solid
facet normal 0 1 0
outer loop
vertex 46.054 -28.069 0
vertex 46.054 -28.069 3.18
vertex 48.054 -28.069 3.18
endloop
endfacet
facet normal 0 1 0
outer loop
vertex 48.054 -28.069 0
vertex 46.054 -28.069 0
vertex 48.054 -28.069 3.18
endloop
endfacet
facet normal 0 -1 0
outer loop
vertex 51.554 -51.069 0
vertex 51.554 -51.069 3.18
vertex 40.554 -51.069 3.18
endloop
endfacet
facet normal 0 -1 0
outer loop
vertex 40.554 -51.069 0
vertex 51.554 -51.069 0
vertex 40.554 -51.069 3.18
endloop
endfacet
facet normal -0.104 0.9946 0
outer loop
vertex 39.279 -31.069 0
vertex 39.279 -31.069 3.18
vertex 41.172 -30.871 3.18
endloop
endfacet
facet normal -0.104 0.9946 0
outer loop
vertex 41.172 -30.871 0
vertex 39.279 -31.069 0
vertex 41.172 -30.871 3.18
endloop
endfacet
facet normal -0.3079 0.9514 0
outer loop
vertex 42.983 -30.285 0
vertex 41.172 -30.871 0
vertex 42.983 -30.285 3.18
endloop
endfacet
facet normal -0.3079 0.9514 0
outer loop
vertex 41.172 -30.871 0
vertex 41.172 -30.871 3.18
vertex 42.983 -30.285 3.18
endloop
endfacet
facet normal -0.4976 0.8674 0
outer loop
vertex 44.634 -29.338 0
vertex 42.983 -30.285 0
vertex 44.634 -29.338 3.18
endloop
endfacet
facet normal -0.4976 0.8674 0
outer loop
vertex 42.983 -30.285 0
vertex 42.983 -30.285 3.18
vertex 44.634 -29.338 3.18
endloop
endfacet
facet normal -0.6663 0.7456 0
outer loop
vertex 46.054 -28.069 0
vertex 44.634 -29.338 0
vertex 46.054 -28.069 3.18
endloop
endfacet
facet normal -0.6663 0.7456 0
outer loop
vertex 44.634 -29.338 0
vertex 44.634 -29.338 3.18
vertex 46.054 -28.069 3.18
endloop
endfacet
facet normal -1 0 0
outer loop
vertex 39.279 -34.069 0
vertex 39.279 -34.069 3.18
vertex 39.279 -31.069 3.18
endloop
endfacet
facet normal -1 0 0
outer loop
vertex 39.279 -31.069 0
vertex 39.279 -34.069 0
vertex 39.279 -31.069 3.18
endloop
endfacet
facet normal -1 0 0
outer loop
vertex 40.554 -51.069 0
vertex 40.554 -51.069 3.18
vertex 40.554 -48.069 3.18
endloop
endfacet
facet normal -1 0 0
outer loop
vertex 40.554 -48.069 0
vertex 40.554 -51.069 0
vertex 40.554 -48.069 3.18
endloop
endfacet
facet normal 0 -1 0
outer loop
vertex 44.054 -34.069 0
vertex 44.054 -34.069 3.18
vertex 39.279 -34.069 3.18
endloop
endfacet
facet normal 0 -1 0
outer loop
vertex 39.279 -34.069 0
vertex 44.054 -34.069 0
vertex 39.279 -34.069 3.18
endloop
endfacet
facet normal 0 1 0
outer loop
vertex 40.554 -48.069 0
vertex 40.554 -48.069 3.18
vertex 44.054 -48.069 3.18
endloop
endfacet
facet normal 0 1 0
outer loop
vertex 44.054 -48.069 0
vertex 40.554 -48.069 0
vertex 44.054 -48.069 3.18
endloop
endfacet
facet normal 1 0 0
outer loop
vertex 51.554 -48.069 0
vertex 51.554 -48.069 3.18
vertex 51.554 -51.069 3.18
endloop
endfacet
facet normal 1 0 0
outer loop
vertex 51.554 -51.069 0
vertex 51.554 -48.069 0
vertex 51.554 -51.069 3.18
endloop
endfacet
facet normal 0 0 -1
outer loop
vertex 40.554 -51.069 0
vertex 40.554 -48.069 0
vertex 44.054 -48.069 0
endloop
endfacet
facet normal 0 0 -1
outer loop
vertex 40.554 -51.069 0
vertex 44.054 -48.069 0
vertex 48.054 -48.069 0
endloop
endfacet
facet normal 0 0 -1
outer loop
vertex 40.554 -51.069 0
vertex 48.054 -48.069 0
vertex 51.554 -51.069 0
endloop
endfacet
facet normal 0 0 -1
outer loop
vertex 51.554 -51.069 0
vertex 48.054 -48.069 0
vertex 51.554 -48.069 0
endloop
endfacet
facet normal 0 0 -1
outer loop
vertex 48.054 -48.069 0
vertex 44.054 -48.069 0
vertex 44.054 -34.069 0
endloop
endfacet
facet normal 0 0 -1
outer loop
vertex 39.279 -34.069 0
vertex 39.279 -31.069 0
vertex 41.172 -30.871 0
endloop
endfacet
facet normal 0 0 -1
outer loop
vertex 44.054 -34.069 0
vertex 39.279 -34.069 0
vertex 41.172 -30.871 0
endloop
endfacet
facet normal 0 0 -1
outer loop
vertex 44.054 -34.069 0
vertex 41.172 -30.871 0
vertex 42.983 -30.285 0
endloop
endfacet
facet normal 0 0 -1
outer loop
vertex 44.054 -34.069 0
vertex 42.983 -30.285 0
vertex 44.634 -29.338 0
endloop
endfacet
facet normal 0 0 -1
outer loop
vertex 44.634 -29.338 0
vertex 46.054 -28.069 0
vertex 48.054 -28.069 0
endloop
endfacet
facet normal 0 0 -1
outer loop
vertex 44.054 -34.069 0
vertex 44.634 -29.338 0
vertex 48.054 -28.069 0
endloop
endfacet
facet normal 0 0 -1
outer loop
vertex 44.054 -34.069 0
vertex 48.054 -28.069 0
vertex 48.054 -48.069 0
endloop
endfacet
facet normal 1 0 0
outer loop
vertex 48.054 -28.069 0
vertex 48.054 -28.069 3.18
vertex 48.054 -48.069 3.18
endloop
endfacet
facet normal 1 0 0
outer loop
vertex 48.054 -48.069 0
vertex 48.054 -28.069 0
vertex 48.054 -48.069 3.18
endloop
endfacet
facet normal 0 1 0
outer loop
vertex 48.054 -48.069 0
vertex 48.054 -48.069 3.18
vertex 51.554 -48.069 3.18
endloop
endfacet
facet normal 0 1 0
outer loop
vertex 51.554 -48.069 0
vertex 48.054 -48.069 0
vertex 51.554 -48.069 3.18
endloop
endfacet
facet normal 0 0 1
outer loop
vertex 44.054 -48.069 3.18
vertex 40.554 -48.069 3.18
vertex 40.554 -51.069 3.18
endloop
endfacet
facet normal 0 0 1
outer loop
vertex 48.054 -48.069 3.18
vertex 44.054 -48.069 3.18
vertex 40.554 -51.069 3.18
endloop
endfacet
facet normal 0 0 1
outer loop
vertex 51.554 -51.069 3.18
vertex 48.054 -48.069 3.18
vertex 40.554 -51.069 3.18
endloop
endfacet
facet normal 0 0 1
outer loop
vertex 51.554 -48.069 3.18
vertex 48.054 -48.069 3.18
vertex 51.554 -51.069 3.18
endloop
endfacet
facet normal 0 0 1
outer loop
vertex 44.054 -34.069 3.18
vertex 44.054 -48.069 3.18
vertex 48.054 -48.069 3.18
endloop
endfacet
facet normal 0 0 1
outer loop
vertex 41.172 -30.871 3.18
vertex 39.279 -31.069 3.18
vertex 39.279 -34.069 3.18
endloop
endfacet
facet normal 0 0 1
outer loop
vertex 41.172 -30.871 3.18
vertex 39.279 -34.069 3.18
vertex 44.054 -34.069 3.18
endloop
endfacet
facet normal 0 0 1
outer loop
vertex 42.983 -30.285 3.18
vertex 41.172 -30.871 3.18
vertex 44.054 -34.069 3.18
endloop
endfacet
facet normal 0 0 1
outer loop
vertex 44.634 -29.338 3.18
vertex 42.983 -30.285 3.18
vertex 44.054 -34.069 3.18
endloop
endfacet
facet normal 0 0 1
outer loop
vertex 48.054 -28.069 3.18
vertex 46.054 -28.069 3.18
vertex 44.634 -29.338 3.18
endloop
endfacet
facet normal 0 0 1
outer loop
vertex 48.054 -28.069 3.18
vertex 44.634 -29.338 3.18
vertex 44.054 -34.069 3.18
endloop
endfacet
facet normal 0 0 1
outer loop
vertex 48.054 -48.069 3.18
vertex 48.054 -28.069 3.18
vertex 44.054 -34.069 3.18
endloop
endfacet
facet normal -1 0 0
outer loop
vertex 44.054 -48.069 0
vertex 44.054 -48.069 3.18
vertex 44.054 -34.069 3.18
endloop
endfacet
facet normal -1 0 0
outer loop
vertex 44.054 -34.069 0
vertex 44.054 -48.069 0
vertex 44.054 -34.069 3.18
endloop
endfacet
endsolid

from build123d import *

# Parameters (mm, degrees)
SKETCH1_W           = 152.4
SKETCH1_H           = 114.3
BOSS_EXTRUDE1_DEPTH = 3.18
SKETCH2_OUTSIDE_W   = 192.506
SKETCH2_OUTSIDE_H   = 154.406
CUT_EXTRUDE2_DEPTH  = 3.18


with BuildPart() as part:
    # Sketch1 → Boss-Extrude1 (new body)
    with BuildSketch(Plane.XY):
        Rectangle(SKETCH1_W, SKETCH1_H)
    extrude(amount=BOSS_EXTRUDE1_DEPTH)

    # Sketch2 outside → Cut-Extrude2 (cut)
    with BuildSketch(Plane.XY.offset(3.18)):
        Rectangle(SKETCH2_OUTSIDE_W, SKETCH2_OUTSIDE_H)
        with BuildLine():
            Line((48.053666352, -28.069013415), (48.053666352, -48.069013415))
            Line((48.053666352, -48.069013415), (51.553666352, -48.069013415))
            Line((51.553666352, -48.069013415), (51.553666352, -51.069013415))
            Line((51.553666352, -51.069013415), (40.553666352, -51.069013415))
            Line((40.553666352, -51.069013415), (40.553666352, -48.069013415))
            Line((40.553666352, -48.069013415), (44.053666352, -48.069013415))
            Line((44.053666352, -48.069013415), (44.053666352, -34.069013415))
            Line((44.053666352, -34.069013415), (39.278768341, -34.069013415))
            Line((39.278768341, -34.069013415), (39.278768341, -31.069013415))
            ThreePointArc((39.278768341, -31.069013415), (42.983469512, -30.28546377), (46.053666352, -28.069013415))
            Line((46.053666352, -28.069013415), (48.053666352, -28.069013415))
        make_face(mode=Mode.SUBTRACT)
    extrude(amount=-CUT_EXTRUDE2_DEPTH, mode=Mode.SUBTRACT)


solid = part.part
